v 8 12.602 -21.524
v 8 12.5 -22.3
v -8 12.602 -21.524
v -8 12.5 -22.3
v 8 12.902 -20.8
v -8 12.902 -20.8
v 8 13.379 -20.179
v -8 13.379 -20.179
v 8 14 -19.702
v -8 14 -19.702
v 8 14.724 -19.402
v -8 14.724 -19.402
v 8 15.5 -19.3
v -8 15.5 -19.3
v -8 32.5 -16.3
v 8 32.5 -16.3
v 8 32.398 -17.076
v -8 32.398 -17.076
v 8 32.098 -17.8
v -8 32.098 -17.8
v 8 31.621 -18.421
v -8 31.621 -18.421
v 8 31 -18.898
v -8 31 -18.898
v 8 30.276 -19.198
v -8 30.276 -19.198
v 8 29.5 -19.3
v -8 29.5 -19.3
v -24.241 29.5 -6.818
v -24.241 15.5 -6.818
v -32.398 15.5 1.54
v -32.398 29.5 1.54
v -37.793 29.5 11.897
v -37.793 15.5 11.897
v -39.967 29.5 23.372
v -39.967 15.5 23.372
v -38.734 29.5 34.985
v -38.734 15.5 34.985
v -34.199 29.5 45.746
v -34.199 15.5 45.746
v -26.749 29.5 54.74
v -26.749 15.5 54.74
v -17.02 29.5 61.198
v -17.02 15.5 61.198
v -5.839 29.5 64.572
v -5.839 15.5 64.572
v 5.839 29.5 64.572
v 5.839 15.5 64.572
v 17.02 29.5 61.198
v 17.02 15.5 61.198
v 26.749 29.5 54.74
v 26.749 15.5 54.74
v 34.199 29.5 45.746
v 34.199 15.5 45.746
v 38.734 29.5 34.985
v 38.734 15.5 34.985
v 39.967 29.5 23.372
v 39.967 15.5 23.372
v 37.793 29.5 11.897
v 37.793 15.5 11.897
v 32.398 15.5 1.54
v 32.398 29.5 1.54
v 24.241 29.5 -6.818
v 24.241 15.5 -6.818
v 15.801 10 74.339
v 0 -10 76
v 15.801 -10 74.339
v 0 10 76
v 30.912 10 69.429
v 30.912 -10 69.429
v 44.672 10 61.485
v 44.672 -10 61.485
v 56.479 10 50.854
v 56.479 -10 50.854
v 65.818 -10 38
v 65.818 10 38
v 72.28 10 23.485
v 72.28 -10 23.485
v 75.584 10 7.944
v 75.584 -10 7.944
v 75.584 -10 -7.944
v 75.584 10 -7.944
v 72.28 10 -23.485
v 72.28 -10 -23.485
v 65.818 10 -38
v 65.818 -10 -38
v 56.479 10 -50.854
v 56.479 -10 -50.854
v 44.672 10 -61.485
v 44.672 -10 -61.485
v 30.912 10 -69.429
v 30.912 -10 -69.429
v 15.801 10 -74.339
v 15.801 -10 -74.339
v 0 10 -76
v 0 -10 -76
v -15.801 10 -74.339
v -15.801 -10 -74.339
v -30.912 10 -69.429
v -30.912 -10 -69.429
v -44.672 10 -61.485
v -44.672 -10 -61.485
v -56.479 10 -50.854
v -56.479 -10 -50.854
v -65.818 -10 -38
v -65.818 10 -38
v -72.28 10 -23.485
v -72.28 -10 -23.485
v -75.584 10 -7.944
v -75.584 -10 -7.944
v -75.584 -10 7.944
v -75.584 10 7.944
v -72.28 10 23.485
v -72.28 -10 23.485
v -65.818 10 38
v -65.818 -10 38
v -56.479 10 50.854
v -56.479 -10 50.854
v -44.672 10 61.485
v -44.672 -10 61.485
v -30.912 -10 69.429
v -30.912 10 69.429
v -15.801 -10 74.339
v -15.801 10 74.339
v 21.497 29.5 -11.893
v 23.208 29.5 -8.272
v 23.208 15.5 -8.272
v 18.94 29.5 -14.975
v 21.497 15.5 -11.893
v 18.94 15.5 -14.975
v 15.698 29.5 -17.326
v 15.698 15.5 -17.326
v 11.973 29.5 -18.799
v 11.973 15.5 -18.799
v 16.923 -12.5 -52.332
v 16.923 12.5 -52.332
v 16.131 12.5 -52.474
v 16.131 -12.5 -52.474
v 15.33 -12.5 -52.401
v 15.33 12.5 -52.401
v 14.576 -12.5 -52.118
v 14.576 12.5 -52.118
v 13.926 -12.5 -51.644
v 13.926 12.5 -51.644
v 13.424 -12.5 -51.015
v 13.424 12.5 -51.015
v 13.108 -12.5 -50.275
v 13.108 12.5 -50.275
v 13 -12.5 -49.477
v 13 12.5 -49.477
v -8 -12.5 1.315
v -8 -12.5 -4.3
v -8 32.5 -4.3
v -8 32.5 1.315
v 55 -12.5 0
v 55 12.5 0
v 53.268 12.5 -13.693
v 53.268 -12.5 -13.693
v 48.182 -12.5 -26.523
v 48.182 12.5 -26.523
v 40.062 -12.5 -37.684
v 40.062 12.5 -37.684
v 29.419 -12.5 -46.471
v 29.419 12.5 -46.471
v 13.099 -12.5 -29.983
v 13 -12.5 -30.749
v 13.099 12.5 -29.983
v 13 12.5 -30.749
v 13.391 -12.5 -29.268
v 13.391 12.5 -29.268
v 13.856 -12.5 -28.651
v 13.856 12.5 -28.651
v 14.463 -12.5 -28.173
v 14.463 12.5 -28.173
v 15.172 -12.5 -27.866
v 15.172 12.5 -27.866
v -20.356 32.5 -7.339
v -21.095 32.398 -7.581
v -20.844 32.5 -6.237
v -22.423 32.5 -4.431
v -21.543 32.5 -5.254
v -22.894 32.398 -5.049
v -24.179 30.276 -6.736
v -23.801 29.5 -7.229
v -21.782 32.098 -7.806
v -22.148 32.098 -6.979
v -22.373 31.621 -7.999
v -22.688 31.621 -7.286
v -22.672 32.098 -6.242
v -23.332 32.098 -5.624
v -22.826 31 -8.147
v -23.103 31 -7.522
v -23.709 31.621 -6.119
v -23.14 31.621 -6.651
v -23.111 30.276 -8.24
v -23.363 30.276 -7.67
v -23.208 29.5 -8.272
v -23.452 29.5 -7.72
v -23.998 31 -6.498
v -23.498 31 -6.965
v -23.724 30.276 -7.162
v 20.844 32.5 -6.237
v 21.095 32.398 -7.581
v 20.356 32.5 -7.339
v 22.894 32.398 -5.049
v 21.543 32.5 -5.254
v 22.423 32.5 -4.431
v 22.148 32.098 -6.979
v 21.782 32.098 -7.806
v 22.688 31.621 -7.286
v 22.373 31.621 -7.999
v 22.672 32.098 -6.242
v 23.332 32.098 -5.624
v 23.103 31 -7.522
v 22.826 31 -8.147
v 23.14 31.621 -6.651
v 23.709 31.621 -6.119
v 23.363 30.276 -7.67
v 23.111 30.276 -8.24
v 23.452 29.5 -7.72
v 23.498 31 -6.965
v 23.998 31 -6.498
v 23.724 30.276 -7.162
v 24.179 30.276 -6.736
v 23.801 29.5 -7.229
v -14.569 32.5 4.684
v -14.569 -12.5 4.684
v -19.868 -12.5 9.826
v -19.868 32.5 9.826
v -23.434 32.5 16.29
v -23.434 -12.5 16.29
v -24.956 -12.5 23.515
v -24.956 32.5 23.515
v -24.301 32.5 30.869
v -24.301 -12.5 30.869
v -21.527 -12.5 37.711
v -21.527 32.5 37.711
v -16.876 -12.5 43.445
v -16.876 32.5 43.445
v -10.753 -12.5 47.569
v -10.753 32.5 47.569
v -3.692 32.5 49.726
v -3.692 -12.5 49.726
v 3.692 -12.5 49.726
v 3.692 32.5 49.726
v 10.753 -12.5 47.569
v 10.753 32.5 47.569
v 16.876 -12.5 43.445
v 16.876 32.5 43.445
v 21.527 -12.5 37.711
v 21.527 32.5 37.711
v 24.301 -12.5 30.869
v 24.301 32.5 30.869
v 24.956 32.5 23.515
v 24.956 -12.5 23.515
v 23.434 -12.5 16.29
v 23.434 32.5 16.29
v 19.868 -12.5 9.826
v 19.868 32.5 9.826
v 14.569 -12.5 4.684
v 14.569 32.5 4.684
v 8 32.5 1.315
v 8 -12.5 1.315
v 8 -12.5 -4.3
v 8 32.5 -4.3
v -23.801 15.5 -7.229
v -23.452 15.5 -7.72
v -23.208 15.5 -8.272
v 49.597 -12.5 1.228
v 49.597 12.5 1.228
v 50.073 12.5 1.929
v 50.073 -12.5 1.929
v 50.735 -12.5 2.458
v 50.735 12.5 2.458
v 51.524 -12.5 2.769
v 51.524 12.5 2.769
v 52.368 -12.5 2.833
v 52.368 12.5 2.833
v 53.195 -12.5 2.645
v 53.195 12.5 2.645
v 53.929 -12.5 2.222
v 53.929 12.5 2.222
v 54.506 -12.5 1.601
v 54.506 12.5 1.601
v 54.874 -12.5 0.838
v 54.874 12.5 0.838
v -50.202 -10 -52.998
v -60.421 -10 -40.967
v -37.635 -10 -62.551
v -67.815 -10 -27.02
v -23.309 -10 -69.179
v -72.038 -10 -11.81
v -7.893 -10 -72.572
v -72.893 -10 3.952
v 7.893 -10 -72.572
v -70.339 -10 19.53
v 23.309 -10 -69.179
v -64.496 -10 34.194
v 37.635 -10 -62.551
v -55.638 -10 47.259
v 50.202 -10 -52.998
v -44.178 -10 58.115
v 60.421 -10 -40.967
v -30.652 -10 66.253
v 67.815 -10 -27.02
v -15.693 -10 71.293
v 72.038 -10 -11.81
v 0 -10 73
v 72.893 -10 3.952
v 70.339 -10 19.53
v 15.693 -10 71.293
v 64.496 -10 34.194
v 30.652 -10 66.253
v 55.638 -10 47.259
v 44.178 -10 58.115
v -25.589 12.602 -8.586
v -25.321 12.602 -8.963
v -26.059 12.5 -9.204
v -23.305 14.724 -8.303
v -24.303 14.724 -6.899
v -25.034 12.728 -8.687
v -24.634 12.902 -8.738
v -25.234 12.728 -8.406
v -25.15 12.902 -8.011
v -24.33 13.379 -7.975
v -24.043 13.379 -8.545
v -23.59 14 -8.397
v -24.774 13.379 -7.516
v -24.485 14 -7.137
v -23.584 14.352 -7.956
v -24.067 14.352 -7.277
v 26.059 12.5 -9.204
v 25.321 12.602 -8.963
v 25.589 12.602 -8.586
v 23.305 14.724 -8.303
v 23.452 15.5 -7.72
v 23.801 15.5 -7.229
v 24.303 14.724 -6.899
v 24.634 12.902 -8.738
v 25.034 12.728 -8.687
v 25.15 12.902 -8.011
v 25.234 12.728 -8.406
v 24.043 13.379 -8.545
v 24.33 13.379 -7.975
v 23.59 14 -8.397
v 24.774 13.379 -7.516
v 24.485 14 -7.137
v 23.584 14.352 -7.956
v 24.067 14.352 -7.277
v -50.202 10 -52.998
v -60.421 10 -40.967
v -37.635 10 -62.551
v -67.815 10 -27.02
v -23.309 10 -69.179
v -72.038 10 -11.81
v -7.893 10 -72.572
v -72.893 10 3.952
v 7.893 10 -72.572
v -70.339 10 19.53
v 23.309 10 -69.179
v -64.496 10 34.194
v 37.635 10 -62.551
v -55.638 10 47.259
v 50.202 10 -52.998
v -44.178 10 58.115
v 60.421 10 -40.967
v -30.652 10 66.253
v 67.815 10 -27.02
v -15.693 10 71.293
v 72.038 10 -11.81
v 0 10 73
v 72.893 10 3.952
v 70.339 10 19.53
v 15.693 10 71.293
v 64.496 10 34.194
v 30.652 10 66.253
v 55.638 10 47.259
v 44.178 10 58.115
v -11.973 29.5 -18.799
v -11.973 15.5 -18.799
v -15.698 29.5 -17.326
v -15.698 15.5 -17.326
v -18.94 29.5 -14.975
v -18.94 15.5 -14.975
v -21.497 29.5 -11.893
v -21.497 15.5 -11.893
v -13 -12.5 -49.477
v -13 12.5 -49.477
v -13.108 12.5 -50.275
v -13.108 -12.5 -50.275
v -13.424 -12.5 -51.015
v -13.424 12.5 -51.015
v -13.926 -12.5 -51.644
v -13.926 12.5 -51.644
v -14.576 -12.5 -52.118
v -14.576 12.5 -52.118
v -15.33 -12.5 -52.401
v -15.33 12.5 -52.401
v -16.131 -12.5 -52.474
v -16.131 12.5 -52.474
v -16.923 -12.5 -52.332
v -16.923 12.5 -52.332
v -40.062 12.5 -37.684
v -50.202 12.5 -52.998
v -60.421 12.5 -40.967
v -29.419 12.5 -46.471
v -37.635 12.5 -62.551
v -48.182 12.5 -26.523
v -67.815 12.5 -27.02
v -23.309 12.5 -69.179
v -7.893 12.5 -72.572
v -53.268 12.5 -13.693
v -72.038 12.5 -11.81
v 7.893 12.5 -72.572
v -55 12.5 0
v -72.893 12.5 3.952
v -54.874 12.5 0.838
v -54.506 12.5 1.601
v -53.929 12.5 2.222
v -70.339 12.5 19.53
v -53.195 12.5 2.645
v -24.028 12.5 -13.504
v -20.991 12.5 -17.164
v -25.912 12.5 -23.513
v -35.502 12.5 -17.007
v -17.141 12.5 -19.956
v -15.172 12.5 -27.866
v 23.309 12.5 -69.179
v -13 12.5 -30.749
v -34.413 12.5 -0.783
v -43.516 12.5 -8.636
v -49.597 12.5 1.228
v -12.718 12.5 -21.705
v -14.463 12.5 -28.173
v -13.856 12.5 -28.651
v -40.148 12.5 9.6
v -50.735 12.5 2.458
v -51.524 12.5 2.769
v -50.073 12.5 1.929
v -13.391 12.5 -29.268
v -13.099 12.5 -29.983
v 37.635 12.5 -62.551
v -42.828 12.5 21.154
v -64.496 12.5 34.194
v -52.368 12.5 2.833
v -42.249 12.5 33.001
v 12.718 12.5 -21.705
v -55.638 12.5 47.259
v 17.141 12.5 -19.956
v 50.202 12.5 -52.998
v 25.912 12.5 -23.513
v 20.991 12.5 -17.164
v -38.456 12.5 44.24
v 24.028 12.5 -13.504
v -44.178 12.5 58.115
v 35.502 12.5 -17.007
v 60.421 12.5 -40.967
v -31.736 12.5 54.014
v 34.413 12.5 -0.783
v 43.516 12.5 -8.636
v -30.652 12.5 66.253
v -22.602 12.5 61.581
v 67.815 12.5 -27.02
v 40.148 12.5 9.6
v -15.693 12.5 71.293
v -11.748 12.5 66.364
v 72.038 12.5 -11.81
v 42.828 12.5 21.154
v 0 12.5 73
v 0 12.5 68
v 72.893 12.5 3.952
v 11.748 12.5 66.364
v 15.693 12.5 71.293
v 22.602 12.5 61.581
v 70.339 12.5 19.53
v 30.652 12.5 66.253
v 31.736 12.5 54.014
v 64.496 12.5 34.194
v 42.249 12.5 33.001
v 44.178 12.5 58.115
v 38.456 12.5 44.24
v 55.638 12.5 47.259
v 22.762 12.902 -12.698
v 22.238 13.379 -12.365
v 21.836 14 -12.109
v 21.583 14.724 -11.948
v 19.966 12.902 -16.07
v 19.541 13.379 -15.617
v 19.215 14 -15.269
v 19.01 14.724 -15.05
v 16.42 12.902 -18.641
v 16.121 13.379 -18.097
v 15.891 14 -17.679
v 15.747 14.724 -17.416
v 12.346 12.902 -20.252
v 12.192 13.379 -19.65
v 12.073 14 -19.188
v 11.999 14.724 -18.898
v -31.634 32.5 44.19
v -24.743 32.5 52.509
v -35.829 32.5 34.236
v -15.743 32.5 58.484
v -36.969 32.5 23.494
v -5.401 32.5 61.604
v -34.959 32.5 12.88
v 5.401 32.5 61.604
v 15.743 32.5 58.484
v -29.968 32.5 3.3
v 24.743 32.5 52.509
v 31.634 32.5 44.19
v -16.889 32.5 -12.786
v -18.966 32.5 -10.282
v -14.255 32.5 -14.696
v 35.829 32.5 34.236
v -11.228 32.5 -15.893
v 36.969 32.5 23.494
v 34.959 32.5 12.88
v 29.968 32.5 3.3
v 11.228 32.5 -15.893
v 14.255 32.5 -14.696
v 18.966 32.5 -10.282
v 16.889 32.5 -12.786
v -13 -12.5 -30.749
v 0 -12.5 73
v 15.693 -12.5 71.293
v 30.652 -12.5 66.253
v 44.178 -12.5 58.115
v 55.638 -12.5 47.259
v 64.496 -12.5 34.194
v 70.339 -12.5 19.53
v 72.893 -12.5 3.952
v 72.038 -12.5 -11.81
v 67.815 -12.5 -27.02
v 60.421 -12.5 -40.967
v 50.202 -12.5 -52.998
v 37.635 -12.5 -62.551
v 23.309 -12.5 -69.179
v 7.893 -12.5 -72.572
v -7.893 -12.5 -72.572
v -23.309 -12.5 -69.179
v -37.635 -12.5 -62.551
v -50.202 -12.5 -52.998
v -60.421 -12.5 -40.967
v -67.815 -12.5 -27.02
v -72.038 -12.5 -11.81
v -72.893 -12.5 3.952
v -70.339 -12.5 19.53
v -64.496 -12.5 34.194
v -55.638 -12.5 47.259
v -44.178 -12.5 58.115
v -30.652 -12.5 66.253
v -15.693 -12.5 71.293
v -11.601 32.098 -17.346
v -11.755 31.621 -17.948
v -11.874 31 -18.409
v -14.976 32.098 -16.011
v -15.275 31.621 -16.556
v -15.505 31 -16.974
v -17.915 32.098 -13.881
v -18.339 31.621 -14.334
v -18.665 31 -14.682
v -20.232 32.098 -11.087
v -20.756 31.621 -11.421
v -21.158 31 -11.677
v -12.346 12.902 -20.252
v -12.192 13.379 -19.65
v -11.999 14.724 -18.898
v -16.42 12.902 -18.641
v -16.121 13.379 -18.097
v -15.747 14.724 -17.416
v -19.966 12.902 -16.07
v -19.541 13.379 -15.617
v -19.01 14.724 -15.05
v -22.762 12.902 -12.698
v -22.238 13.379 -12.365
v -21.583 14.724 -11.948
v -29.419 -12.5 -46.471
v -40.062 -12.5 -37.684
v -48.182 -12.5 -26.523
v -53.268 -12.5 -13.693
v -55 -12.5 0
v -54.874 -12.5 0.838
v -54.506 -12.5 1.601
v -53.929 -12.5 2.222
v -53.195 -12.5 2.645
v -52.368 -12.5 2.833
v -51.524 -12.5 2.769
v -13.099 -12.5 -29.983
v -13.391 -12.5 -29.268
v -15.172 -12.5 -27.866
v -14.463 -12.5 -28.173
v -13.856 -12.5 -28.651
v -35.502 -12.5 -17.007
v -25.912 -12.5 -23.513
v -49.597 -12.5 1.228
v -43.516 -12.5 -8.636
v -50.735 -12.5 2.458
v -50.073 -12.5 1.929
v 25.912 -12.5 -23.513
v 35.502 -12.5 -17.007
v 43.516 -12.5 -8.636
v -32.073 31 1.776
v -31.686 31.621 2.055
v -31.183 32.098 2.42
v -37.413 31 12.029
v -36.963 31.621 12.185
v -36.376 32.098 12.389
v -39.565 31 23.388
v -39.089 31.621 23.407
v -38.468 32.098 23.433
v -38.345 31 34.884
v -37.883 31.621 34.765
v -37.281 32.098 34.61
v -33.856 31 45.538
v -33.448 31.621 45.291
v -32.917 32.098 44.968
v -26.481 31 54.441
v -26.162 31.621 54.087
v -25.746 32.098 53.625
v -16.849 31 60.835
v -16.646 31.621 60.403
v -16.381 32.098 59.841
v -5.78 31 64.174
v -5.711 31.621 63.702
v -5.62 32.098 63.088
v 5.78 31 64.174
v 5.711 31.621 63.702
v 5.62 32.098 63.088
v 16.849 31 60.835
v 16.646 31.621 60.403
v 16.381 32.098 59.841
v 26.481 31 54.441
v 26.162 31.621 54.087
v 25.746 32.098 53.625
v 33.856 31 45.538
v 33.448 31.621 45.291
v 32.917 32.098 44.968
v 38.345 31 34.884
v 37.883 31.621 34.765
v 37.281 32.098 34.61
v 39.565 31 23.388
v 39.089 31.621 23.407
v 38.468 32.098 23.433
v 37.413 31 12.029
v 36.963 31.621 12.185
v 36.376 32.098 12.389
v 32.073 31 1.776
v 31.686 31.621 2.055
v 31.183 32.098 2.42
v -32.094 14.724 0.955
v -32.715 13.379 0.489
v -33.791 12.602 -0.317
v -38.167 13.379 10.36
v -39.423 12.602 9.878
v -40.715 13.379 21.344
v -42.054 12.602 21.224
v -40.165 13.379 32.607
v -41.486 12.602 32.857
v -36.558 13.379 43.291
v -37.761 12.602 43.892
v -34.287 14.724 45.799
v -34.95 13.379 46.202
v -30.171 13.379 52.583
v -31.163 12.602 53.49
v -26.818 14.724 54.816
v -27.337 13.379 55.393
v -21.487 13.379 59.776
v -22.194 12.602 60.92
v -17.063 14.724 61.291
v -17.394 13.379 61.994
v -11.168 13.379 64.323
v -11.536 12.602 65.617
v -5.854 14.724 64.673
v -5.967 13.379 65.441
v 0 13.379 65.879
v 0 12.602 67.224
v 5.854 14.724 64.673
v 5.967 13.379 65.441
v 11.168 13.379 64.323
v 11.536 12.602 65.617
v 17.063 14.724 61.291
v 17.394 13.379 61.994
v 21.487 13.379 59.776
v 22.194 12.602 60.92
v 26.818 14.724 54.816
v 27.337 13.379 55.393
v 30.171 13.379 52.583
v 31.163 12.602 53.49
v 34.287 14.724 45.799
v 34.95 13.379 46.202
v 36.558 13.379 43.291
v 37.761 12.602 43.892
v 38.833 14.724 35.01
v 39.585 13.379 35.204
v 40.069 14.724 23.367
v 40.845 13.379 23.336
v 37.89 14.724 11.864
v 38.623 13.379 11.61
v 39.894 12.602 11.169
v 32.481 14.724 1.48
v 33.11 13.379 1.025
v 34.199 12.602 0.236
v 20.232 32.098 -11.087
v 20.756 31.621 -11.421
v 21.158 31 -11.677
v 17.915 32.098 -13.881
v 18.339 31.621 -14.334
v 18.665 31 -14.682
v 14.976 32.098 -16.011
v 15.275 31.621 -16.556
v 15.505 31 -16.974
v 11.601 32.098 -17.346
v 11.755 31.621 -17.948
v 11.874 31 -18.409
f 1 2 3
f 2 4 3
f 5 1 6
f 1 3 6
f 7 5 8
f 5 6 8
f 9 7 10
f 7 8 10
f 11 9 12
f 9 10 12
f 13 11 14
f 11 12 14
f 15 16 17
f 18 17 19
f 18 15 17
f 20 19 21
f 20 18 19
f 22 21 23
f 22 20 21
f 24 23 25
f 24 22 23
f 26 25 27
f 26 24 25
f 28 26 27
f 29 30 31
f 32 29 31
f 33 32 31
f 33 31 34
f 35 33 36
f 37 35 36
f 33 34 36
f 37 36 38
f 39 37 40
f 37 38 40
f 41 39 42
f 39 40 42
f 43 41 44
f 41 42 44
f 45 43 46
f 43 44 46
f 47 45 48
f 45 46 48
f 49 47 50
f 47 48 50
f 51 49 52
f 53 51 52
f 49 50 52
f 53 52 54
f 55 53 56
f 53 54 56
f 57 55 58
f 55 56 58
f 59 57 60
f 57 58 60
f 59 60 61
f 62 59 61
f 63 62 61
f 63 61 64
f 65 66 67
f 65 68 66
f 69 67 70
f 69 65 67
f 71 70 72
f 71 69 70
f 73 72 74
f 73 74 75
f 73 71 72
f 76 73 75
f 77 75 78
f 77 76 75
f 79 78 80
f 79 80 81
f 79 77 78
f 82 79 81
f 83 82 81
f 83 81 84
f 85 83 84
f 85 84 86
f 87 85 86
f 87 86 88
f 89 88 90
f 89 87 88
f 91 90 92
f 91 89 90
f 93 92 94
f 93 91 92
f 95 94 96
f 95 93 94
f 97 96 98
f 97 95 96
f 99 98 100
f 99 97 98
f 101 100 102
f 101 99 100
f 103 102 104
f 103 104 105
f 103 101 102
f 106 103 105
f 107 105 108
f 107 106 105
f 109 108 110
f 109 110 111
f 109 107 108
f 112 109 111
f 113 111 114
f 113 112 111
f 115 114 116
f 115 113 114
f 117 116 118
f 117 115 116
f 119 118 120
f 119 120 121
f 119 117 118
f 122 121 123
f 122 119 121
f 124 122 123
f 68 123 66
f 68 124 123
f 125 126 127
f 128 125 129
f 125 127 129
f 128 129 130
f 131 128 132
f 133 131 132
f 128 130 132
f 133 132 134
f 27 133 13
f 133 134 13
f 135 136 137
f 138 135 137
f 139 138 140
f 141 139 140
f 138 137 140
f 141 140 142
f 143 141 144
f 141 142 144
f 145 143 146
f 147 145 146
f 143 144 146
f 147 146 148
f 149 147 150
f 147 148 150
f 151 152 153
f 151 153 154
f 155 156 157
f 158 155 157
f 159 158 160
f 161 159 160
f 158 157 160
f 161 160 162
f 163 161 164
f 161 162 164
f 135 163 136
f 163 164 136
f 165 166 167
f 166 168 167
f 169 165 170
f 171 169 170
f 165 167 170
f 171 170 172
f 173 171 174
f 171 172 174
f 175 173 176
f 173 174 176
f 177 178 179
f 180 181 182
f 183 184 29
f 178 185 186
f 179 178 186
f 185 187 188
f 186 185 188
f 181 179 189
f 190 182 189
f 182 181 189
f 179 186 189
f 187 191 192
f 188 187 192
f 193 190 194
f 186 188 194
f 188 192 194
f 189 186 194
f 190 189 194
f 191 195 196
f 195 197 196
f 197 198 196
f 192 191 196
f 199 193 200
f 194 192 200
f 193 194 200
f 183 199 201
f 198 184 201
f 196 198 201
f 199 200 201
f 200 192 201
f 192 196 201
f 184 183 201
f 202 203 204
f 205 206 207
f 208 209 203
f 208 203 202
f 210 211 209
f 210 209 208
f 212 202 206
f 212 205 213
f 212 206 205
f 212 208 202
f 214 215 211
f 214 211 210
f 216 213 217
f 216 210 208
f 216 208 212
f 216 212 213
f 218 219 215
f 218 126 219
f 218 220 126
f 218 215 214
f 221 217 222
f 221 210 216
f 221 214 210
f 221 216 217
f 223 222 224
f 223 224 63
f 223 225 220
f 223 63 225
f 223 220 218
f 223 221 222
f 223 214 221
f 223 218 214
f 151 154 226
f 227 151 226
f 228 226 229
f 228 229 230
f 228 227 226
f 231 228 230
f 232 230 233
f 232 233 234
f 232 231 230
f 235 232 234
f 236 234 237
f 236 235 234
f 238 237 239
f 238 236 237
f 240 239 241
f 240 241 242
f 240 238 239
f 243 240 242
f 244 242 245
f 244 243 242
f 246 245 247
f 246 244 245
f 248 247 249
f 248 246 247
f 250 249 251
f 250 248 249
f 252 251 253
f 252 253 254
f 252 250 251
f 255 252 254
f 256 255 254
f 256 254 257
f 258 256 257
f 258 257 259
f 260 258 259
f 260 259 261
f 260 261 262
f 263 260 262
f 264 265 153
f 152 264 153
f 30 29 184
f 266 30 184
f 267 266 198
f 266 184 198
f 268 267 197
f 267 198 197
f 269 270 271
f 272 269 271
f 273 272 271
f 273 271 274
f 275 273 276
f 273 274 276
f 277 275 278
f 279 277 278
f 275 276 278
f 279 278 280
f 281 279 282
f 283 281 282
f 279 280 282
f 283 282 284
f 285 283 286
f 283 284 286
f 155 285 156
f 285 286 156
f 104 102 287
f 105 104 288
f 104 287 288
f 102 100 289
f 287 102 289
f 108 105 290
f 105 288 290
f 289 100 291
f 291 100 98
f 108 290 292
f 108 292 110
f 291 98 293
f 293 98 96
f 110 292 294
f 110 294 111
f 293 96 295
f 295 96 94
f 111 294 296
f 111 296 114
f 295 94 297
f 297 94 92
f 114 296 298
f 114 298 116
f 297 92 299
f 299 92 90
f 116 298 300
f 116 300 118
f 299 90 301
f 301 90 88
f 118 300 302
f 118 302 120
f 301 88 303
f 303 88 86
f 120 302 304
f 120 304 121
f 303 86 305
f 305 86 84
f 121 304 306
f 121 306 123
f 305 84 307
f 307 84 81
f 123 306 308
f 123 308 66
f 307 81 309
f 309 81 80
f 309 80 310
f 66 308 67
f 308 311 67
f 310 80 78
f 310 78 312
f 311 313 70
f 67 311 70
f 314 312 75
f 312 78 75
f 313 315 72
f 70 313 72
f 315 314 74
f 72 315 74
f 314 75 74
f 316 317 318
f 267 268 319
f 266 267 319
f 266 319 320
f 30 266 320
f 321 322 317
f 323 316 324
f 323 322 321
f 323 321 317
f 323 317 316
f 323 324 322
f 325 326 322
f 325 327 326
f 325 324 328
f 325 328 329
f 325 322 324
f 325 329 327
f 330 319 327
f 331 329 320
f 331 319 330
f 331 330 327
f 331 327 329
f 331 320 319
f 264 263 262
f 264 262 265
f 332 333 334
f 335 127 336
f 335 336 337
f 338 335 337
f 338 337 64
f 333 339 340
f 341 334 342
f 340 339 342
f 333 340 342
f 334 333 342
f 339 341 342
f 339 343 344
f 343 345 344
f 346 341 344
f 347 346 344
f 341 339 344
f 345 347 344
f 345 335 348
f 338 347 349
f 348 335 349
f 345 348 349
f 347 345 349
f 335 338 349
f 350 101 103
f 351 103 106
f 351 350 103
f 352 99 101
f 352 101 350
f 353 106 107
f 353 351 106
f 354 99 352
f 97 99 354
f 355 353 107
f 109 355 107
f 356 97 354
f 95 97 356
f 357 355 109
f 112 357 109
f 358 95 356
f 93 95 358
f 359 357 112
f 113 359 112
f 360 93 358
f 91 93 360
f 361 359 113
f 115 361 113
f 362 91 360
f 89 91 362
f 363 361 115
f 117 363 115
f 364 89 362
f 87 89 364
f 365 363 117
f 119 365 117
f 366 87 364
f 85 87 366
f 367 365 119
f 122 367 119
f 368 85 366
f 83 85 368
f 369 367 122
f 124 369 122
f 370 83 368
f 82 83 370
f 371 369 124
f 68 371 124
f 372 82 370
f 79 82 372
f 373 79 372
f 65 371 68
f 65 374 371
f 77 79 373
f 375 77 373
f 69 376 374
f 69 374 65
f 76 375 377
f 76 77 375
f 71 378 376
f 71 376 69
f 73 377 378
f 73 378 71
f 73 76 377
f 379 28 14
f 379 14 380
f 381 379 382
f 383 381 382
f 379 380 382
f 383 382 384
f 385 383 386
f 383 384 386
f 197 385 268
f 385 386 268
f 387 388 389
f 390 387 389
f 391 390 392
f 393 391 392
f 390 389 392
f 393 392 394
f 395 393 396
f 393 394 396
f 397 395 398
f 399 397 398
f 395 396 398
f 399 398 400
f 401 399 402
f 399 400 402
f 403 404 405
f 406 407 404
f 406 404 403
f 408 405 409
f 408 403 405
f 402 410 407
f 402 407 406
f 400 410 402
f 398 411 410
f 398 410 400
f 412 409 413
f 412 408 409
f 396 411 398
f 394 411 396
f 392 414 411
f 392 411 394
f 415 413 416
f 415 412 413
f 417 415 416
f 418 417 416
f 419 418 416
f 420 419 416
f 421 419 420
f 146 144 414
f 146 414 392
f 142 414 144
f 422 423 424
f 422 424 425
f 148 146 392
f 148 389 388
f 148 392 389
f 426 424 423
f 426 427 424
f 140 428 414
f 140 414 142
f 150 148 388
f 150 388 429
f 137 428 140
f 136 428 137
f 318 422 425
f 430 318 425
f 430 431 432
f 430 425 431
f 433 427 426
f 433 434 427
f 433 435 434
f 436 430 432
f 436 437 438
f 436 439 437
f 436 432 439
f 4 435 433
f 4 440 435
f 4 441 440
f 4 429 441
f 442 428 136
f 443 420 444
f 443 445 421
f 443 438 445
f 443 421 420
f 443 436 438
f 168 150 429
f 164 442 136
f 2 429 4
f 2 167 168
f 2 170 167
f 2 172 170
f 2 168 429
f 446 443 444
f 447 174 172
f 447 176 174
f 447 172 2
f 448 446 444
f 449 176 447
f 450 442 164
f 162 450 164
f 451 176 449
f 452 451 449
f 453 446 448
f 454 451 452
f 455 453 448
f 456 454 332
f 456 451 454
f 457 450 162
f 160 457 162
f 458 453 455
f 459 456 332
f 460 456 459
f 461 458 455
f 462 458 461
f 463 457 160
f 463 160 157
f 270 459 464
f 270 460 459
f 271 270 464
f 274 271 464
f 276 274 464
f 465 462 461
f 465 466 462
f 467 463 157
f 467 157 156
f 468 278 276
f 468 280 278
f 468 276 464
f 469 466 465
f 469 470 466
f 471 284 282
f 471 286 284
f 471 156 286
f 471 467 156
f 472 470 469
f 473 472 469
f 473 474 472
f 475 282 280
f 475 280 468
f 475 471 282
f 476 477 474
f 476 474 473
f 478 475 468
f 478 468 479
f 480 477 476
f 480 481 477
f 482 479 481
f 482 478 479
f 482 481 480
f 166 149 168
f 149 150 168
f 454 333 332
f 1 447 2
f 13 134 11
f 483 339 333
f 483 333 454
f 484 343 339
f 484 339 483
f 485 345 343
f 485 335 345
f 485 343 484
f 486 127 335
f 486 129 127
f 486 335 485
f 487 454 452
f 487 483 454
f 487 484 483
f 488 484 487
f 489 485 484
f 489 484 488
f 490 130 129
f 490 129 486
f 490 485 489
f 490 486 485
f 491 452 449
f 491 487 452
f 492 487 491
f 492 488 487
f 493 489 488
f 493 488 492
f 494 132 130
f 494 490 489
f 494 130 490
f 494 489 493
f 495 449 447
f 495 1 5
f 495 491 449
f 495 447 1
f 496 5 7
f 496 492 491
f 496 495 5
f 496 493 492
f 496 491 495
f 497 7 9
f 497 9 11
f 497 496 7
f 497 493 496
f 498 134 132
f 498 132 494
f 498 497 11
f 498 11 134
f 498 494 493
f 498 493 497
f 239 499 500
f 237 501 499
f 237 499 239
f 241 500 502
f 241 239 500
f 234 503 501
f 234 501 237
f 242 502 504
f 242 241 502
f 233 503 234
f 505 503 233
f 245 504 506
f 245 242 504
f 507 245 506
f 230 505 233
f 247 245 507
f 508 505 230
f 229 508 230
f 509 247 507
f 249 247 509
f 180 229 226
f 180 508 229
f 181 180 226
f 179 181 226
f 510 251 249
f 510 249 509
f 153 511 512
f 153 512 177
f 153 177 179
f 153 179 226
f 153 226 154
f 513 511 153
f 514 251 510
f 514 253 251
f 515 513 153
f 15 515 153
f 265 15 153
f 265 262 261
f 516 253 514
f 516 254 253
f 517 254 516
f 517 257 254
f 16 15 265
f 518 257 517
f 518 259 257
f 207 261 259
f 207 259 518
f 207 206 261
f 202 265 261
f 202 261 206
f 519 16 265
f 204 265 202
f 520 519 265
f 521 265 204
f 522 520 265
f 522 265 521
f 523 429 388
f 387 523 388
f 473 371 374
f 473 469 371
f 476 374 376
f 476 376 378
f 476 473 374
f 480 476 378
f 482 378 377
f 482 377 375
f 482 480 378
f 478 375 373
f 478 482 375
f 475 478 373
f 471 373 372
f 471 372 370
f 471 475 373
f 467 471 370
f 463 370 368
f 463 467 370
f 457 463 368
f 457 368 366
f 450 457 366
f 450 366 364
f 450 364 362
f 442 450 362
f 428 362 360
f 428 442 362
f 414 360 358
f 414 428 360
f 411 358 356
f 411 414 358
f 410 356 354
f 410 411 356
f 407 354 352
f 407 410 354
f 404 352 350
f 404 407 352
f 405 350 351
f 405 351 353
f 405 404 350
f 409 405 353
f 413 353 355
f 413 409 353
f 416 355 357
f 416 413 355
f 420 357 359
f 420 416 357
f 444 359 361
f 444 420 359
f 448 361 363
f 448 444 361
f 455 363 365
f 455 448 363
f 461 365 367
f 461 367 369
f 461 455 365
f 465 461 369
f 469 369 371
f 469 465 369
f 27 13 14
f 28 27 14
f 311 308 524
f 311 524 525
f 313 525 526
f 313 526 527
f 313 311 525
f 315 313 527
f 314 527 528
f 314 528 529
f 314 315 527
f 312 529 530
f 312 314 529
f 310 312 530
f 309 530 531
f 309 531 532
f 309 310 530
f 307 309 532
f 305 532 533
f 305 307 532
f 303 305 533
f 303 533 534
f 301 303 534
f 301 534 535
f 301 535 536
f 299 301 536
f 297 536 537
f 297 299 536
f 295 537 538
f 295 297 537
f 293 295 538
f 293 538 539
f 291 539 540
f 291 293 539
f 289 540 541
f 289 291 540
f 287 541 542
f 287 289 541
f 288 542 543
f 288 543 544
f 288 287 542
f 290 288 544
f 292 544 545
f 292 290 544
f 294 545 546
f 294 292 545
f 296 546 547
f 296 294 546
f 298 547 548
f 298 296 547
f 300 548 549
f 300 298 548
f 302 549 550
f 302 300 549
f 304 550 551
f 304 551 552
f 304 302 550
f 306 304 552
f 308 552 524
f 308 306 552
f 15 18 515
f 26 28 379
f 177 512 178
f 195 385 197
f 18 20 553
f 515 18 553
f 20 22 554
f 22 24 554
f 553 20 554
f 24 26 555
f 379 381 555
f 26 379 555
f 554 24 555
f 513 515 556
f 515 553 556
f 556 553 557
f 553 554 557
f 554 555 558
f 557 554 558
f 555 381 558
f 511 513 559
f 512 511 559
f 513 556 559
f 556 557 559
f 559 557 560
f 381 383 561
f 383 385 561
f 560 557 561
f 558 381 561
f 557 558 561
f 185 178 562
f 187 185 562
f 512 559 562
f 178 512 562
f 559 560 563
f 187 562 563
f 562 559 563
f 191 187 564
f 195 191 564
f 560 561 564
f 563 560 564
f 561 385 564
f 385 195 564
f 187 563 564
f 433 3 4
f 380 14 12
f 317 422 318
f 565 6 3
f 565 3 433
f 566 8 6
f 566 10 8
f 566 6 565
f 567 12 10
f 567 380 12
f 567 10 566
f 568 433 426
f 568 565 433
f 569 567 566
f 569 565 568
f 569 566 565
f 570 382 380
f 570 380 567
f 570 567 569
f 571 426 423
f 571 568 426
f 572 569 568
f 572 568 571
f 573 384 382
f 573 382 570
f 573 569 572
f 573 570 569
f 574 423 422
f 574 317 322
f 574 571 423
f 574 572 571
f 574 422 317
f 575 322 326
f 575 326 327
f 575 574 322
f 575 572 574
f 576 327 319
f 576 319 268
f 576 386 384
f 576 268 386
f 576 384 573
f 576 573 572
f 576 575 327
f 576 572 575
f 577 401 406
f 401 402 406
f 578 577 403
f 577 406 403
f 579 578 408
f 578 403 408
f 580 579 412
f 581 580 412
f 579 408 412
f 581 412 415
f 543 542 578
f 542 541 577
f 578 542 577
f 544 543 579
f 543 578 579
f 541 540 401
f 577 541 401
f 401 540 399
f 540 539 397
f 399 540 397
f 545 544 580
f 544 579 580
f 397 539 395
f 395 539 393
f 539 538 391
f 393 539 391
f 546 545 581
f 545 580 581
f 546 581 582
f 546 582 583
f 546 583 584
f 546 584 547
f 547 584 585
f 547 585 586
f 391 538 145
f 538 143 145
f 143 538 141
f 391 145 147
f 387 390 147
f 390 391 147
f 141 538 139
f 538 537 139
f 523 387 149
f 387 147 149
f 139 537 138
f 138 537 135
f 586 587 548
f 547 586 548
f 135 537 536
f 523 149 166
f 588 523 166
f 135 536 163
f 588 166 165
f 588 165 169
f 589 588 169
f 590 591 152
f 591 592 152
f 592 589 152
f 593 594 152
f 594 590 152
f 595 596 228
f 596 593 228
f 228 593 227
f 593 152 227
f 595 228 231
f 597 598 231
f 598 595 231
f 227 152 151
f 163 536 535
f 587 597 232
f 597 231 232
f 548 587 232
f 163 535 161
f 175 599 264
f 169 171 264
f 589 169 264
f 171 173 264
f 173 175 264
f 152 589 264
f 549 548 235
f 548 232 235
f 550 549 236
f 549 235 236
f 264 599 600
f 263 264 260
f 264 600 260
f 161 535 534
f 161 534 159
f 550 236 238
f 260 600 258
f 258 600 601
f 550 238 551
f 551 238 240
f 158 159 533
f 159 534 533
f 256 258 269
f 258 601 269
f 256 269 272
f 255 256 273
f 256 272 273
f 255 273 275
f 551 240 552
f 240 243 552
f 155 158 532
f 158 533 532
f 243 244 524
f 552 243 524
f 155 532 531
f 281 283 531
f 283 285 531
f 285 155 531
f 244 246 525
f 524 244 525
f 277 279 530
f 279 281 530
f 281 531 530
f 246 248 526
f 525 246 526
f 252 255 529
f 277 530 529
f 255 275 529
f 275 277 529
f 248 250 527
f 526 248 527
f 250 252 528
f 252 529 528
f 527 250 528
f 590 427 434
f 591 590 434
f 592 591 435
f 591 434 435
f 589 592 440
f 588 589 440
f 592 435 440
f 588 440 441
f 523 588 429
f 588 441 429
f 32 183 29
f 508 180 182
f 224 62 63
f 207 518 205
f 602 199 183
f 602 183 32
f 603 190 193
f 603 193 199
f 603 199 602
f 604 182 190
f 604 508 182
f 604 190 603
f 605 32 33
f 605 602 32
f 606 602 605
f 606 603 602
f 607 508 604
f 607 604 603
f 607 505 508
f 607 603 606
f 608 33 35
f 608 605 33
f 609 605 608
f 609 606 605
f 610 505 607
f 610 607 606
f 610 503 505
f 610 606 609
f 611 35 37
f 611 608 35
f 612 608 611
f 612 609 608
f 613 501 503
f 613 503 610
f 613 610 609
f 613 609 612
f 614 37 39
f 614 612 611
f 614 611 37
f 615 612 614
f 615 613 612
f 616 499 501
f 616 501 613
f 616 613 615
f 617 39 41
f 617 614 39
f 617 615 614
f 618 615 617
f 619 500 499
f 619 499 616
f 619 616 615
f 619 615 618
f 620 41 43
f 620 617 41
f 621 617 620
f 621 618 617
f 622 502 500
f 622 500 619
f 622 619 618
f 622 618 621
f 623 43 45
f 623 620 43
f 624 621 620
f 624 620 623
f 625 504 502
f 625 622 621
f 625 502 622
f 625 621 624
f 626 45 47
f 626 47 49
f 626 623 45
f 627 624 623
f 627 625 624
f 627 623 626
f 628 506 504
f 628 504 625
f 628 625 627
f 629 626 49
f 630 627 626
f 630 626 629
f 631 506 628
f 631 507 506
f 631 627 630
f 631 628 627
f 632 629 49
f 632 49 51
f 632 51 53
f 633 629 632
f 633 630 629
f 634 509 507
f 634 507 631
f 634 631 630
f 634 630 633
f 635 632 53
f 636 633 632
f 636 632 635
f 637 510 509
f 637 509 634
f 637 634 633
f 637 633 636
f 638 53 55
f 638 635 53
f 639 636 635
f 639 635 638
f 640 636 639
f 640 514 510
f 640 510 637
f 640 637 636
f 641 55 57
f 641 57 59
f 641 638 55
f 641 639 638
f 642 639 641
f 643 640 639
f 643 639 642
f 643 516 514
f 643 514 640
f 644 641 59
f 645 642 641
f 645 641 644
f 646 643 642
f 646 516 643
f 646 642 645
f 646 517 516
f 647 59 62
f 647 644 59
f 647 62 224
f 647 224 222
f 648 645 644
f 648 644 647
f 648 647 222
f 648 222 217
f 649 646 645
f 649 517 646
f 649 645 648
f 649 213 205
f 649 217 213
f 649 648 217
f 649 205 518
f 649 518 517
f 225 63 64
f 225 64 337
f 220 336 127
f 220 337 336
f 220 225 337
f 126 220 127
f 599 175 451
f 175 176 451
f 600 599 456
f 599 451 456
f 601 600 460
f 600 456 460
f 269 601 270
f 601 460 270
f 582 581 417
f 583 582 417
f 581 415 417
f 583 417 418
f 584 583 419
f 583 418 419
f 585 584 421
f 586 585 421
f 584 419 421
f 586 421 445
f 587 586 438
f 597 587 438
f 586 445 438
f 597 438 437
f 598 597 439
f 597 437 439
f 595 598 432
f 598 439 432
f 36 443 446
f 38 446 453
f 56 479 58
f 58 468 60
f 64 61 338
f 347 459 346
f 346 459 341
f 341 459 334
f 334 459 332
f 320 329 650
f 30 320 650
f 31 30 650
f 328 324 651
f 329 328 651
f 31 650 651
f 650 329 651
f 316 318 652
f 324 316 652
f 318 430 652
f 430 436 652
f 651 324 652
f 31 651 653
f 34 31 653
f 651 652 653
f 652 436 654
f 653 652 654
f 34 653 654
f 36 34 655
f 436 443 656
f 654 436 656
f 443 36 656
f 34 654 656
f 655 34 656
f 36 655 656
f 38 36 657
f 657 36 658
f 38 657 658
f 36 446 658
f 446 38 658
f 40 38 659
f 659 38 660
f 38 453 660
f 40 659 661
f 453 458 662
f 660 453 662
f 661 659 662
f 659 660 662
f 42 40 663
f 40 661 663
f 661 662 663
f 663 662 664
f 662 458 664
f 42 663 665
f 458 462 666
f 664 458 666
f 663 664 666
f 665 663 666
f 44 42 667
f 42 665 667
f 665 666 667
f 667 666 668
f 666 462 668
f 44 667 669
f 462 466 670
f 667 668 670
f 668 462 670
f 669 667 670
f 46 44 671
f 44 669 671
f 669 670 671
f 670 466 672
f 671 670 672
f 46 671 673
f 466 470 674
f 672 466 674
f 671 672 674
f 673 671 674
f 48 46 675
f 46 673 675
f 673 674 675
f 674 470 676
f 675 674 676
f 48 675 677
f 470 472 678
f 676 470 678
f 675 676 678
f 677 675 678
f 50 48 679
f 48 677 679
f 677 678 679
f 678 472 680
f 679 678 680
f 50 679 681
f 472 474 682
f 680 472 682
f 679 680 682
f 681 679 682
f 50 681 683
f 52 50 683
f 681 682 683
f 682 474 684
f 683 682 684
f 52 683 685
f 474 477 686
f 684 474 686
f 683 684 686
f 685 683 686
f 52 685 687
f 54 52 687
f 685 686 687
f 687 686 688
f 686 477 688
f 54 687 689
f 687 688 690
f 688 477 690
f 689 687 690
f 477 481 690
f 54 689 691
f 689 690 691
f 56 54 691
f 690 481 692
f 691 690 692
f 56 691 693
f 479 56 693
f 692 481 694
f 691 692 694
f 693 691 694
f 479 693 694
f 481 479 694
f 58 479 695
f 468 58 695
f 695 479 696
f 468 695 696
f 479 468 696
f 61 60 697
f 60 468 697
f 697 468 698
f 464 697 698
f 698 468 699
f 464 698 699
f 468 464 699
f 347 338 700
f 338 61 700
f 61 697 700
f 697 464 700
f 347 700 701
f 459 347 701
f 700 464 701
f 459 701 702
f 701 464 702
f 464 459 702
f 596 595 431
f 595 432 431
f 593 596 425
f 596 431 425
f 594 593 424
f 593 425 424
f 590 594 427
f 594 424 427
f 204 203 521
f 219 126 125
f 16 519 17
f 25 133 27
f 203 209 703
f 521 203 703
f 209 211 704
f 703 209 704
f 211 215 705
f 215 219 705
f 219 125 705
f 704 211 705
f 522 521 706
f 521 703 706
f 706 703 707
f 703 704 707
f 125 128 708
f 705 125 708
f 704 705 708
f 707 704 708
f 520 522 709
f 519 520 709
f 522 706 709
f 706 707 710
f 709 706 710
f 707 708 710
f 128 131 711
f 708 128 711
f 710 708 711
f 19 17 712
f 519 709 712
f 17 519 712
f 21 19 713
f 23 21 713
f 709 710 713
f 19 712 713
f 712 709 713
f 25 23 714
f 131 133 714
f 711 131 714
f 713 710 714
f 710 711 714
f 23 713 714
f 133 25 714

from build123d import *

# Parameters (mm, degrees)
SKETCH1_R                = 73
BOSS_EXTRUDE1_DEPTH      = 12.5
SKETCH1_3_R              = 76
SKETCH1_3_R_2            = 73
BOSS_EXTRUDE2_DEPTH      = 10
BOSS_EXTRUDE3_DEPTH      = 32.5
BOSS_EXTRUDE3_DEPTH_BACK = 12.5
FILLET1_R                = 3


with BuildPart() as part:
    # Sketch1 → Boss-Extrude1 (new, symmetric)
    with BuildSketch(Plane(origin=(0, 0, 0), x_dir=(1, 0, 0), z_dir=(0, 1, 0))):
        Circle(SKETCH1_R)
        with BuildLine():
            ThreePointArc((-23.467803367, 7.392317069), (-17.76019792, 15.978270251), (-8, 19.3))
            Line((-8, 19.3), (8, 19.3))
            ThreePointArc((8, 19.3), (17.76019792, 15.978270251), (23.467803367, 7.392317069))
            ThreePointArc((23.467803367, 7.392317069), (0, -65), (-23.467803367, 7.392317069))
        make_face(mode=Mode.SUBTRACT)
        with BuildLine():
            ThreePointArc((-16.923076923, 52.331725248), (-14.234954784, 51.903090128), (-13, 49.477267507))
            Line((-13, 49.477267507), (-13, 30.749439459))
            ThreePointArc((-13, 30.749439459), (-13.603882451, 28.944274456), (-15.172413793, 27.865847763))
            ThreePointArc((-15.172413793, 27.865847763), (-35.501955289, 17.007275211), (-49.597249509, -1.227897839))
            ThreePointArc((-49.597249509, -1.227897839), (-52.788696317, -2.770263795), (-55, 0))
            ThreePointArc((-55, 0), (-44.473414703, 32.359162298), (-16.923076923, 52.331725248))
        make_face(mode=Mode.SUBTRACT)
        with BuildLine():
            Line((13, 30.749439459), (13, 49.477267507))
            ThreePointArc((13, 49.477267507), (14.234954784, 51.903090128), (16.923076923, 52.331725248))
            ThreePointArc((16.923076923, 52.331725248), (44.473414703, 32.359162298), (55, 0))
            ThreePointArc((55, 0), (52.788696317, -2.770263795), (49.597249509, -1.227897839))
            ThreePointArc((49.597249509, -1.227897839), (35.501955289, 17.007275211), (15.172413793, 27.865847763))
            ThreePointArc((15.172413793, 27.865847763), (13.603882451, 28.944274456), (13, 30.749439459))
        make_face(mode=Mode.SUBTRACT)
    extrude(amount=BOSS_EXTRUDE1_DEPTH, both=True)

    # Sketch1<3> → Boss-Extrude2 (add, symmetric)
    with BuildSketch(Plane(origin=(0, 0, 0), x_dir=(1, 0, 0), z_dir=(0, 1, 0))):
        Circle(SKETCH1_3_R)
        Circle(SKETCH1_3_R_2, mode=Mode.SUBTRACT)
    extrude(amount=BOSS_EXTRUDE2_DEPTH, both=True)

    # Sketch1<4> → Boss-Extrude3 (add, two sides: drawn at the far end of the back side and taken through both)
    with BuildSketch(Plane(origin=(0, 0, 0), x_dir=(1, 0, 0), z_dir=(0, 1, 0)).offset(-BOSS_EXTRUDE3_DEPTH_BACK)):
        with BuildLine():
            Line((8, 19.3), (-8, 19.3))
            ThreePointArc((-8, 19.3), (-17.76019792, 15.978270251), (-23.467803367, 7.392317069))
            ThreePointArc((-23.467803367, 7.392317069), (0, -65), (23.467803367, 7.392317069))
            ThreePointArc((23.467803367, 7.392317069), (17.76019792, 15.978270251), (8, 19.3))
        make_face()
        with BuildLine():
            Line((-8, -1.314561435), (-8, 4.3))
            Line((-8, 4.3), (8, 4.3))
            Line((8, 4.3), (8, -1.314561435))
            ThreePointArc((8, -1.314561435), (0, -50), (-8, -1.314561435))
        make_face(mode=Mode.SUBTRACT)
    extrude(amount=BOSS_EXTRUDE3_DEPTH + BOSS_EXTRUDE3_DEPTH_BACK)

    # Fillet1
    fillet1_edges = [part.edges().sort_by_distance(p)[0] for p in [
        (-23.467803367, 22.5, -7.392317069),
        (23.467803367, 22.5, -7.392317069),
        (0, 12.5, -19.3),
        (-17.76019792, 12.5, -15.978270251),
        (0, 12.5, 65),
        (17.76019792, 12.5, -15.978270251),
        (-17.76019792, 32.5, -15.978270251),
        (17.76019792, 32.5, -15.978270251),
        (0, 32.5, 65),
        (0, 32.5, -19.3),
    ]]
    fillet(fillet1_edges, radius=FILLET1_R)


solid = part.part
